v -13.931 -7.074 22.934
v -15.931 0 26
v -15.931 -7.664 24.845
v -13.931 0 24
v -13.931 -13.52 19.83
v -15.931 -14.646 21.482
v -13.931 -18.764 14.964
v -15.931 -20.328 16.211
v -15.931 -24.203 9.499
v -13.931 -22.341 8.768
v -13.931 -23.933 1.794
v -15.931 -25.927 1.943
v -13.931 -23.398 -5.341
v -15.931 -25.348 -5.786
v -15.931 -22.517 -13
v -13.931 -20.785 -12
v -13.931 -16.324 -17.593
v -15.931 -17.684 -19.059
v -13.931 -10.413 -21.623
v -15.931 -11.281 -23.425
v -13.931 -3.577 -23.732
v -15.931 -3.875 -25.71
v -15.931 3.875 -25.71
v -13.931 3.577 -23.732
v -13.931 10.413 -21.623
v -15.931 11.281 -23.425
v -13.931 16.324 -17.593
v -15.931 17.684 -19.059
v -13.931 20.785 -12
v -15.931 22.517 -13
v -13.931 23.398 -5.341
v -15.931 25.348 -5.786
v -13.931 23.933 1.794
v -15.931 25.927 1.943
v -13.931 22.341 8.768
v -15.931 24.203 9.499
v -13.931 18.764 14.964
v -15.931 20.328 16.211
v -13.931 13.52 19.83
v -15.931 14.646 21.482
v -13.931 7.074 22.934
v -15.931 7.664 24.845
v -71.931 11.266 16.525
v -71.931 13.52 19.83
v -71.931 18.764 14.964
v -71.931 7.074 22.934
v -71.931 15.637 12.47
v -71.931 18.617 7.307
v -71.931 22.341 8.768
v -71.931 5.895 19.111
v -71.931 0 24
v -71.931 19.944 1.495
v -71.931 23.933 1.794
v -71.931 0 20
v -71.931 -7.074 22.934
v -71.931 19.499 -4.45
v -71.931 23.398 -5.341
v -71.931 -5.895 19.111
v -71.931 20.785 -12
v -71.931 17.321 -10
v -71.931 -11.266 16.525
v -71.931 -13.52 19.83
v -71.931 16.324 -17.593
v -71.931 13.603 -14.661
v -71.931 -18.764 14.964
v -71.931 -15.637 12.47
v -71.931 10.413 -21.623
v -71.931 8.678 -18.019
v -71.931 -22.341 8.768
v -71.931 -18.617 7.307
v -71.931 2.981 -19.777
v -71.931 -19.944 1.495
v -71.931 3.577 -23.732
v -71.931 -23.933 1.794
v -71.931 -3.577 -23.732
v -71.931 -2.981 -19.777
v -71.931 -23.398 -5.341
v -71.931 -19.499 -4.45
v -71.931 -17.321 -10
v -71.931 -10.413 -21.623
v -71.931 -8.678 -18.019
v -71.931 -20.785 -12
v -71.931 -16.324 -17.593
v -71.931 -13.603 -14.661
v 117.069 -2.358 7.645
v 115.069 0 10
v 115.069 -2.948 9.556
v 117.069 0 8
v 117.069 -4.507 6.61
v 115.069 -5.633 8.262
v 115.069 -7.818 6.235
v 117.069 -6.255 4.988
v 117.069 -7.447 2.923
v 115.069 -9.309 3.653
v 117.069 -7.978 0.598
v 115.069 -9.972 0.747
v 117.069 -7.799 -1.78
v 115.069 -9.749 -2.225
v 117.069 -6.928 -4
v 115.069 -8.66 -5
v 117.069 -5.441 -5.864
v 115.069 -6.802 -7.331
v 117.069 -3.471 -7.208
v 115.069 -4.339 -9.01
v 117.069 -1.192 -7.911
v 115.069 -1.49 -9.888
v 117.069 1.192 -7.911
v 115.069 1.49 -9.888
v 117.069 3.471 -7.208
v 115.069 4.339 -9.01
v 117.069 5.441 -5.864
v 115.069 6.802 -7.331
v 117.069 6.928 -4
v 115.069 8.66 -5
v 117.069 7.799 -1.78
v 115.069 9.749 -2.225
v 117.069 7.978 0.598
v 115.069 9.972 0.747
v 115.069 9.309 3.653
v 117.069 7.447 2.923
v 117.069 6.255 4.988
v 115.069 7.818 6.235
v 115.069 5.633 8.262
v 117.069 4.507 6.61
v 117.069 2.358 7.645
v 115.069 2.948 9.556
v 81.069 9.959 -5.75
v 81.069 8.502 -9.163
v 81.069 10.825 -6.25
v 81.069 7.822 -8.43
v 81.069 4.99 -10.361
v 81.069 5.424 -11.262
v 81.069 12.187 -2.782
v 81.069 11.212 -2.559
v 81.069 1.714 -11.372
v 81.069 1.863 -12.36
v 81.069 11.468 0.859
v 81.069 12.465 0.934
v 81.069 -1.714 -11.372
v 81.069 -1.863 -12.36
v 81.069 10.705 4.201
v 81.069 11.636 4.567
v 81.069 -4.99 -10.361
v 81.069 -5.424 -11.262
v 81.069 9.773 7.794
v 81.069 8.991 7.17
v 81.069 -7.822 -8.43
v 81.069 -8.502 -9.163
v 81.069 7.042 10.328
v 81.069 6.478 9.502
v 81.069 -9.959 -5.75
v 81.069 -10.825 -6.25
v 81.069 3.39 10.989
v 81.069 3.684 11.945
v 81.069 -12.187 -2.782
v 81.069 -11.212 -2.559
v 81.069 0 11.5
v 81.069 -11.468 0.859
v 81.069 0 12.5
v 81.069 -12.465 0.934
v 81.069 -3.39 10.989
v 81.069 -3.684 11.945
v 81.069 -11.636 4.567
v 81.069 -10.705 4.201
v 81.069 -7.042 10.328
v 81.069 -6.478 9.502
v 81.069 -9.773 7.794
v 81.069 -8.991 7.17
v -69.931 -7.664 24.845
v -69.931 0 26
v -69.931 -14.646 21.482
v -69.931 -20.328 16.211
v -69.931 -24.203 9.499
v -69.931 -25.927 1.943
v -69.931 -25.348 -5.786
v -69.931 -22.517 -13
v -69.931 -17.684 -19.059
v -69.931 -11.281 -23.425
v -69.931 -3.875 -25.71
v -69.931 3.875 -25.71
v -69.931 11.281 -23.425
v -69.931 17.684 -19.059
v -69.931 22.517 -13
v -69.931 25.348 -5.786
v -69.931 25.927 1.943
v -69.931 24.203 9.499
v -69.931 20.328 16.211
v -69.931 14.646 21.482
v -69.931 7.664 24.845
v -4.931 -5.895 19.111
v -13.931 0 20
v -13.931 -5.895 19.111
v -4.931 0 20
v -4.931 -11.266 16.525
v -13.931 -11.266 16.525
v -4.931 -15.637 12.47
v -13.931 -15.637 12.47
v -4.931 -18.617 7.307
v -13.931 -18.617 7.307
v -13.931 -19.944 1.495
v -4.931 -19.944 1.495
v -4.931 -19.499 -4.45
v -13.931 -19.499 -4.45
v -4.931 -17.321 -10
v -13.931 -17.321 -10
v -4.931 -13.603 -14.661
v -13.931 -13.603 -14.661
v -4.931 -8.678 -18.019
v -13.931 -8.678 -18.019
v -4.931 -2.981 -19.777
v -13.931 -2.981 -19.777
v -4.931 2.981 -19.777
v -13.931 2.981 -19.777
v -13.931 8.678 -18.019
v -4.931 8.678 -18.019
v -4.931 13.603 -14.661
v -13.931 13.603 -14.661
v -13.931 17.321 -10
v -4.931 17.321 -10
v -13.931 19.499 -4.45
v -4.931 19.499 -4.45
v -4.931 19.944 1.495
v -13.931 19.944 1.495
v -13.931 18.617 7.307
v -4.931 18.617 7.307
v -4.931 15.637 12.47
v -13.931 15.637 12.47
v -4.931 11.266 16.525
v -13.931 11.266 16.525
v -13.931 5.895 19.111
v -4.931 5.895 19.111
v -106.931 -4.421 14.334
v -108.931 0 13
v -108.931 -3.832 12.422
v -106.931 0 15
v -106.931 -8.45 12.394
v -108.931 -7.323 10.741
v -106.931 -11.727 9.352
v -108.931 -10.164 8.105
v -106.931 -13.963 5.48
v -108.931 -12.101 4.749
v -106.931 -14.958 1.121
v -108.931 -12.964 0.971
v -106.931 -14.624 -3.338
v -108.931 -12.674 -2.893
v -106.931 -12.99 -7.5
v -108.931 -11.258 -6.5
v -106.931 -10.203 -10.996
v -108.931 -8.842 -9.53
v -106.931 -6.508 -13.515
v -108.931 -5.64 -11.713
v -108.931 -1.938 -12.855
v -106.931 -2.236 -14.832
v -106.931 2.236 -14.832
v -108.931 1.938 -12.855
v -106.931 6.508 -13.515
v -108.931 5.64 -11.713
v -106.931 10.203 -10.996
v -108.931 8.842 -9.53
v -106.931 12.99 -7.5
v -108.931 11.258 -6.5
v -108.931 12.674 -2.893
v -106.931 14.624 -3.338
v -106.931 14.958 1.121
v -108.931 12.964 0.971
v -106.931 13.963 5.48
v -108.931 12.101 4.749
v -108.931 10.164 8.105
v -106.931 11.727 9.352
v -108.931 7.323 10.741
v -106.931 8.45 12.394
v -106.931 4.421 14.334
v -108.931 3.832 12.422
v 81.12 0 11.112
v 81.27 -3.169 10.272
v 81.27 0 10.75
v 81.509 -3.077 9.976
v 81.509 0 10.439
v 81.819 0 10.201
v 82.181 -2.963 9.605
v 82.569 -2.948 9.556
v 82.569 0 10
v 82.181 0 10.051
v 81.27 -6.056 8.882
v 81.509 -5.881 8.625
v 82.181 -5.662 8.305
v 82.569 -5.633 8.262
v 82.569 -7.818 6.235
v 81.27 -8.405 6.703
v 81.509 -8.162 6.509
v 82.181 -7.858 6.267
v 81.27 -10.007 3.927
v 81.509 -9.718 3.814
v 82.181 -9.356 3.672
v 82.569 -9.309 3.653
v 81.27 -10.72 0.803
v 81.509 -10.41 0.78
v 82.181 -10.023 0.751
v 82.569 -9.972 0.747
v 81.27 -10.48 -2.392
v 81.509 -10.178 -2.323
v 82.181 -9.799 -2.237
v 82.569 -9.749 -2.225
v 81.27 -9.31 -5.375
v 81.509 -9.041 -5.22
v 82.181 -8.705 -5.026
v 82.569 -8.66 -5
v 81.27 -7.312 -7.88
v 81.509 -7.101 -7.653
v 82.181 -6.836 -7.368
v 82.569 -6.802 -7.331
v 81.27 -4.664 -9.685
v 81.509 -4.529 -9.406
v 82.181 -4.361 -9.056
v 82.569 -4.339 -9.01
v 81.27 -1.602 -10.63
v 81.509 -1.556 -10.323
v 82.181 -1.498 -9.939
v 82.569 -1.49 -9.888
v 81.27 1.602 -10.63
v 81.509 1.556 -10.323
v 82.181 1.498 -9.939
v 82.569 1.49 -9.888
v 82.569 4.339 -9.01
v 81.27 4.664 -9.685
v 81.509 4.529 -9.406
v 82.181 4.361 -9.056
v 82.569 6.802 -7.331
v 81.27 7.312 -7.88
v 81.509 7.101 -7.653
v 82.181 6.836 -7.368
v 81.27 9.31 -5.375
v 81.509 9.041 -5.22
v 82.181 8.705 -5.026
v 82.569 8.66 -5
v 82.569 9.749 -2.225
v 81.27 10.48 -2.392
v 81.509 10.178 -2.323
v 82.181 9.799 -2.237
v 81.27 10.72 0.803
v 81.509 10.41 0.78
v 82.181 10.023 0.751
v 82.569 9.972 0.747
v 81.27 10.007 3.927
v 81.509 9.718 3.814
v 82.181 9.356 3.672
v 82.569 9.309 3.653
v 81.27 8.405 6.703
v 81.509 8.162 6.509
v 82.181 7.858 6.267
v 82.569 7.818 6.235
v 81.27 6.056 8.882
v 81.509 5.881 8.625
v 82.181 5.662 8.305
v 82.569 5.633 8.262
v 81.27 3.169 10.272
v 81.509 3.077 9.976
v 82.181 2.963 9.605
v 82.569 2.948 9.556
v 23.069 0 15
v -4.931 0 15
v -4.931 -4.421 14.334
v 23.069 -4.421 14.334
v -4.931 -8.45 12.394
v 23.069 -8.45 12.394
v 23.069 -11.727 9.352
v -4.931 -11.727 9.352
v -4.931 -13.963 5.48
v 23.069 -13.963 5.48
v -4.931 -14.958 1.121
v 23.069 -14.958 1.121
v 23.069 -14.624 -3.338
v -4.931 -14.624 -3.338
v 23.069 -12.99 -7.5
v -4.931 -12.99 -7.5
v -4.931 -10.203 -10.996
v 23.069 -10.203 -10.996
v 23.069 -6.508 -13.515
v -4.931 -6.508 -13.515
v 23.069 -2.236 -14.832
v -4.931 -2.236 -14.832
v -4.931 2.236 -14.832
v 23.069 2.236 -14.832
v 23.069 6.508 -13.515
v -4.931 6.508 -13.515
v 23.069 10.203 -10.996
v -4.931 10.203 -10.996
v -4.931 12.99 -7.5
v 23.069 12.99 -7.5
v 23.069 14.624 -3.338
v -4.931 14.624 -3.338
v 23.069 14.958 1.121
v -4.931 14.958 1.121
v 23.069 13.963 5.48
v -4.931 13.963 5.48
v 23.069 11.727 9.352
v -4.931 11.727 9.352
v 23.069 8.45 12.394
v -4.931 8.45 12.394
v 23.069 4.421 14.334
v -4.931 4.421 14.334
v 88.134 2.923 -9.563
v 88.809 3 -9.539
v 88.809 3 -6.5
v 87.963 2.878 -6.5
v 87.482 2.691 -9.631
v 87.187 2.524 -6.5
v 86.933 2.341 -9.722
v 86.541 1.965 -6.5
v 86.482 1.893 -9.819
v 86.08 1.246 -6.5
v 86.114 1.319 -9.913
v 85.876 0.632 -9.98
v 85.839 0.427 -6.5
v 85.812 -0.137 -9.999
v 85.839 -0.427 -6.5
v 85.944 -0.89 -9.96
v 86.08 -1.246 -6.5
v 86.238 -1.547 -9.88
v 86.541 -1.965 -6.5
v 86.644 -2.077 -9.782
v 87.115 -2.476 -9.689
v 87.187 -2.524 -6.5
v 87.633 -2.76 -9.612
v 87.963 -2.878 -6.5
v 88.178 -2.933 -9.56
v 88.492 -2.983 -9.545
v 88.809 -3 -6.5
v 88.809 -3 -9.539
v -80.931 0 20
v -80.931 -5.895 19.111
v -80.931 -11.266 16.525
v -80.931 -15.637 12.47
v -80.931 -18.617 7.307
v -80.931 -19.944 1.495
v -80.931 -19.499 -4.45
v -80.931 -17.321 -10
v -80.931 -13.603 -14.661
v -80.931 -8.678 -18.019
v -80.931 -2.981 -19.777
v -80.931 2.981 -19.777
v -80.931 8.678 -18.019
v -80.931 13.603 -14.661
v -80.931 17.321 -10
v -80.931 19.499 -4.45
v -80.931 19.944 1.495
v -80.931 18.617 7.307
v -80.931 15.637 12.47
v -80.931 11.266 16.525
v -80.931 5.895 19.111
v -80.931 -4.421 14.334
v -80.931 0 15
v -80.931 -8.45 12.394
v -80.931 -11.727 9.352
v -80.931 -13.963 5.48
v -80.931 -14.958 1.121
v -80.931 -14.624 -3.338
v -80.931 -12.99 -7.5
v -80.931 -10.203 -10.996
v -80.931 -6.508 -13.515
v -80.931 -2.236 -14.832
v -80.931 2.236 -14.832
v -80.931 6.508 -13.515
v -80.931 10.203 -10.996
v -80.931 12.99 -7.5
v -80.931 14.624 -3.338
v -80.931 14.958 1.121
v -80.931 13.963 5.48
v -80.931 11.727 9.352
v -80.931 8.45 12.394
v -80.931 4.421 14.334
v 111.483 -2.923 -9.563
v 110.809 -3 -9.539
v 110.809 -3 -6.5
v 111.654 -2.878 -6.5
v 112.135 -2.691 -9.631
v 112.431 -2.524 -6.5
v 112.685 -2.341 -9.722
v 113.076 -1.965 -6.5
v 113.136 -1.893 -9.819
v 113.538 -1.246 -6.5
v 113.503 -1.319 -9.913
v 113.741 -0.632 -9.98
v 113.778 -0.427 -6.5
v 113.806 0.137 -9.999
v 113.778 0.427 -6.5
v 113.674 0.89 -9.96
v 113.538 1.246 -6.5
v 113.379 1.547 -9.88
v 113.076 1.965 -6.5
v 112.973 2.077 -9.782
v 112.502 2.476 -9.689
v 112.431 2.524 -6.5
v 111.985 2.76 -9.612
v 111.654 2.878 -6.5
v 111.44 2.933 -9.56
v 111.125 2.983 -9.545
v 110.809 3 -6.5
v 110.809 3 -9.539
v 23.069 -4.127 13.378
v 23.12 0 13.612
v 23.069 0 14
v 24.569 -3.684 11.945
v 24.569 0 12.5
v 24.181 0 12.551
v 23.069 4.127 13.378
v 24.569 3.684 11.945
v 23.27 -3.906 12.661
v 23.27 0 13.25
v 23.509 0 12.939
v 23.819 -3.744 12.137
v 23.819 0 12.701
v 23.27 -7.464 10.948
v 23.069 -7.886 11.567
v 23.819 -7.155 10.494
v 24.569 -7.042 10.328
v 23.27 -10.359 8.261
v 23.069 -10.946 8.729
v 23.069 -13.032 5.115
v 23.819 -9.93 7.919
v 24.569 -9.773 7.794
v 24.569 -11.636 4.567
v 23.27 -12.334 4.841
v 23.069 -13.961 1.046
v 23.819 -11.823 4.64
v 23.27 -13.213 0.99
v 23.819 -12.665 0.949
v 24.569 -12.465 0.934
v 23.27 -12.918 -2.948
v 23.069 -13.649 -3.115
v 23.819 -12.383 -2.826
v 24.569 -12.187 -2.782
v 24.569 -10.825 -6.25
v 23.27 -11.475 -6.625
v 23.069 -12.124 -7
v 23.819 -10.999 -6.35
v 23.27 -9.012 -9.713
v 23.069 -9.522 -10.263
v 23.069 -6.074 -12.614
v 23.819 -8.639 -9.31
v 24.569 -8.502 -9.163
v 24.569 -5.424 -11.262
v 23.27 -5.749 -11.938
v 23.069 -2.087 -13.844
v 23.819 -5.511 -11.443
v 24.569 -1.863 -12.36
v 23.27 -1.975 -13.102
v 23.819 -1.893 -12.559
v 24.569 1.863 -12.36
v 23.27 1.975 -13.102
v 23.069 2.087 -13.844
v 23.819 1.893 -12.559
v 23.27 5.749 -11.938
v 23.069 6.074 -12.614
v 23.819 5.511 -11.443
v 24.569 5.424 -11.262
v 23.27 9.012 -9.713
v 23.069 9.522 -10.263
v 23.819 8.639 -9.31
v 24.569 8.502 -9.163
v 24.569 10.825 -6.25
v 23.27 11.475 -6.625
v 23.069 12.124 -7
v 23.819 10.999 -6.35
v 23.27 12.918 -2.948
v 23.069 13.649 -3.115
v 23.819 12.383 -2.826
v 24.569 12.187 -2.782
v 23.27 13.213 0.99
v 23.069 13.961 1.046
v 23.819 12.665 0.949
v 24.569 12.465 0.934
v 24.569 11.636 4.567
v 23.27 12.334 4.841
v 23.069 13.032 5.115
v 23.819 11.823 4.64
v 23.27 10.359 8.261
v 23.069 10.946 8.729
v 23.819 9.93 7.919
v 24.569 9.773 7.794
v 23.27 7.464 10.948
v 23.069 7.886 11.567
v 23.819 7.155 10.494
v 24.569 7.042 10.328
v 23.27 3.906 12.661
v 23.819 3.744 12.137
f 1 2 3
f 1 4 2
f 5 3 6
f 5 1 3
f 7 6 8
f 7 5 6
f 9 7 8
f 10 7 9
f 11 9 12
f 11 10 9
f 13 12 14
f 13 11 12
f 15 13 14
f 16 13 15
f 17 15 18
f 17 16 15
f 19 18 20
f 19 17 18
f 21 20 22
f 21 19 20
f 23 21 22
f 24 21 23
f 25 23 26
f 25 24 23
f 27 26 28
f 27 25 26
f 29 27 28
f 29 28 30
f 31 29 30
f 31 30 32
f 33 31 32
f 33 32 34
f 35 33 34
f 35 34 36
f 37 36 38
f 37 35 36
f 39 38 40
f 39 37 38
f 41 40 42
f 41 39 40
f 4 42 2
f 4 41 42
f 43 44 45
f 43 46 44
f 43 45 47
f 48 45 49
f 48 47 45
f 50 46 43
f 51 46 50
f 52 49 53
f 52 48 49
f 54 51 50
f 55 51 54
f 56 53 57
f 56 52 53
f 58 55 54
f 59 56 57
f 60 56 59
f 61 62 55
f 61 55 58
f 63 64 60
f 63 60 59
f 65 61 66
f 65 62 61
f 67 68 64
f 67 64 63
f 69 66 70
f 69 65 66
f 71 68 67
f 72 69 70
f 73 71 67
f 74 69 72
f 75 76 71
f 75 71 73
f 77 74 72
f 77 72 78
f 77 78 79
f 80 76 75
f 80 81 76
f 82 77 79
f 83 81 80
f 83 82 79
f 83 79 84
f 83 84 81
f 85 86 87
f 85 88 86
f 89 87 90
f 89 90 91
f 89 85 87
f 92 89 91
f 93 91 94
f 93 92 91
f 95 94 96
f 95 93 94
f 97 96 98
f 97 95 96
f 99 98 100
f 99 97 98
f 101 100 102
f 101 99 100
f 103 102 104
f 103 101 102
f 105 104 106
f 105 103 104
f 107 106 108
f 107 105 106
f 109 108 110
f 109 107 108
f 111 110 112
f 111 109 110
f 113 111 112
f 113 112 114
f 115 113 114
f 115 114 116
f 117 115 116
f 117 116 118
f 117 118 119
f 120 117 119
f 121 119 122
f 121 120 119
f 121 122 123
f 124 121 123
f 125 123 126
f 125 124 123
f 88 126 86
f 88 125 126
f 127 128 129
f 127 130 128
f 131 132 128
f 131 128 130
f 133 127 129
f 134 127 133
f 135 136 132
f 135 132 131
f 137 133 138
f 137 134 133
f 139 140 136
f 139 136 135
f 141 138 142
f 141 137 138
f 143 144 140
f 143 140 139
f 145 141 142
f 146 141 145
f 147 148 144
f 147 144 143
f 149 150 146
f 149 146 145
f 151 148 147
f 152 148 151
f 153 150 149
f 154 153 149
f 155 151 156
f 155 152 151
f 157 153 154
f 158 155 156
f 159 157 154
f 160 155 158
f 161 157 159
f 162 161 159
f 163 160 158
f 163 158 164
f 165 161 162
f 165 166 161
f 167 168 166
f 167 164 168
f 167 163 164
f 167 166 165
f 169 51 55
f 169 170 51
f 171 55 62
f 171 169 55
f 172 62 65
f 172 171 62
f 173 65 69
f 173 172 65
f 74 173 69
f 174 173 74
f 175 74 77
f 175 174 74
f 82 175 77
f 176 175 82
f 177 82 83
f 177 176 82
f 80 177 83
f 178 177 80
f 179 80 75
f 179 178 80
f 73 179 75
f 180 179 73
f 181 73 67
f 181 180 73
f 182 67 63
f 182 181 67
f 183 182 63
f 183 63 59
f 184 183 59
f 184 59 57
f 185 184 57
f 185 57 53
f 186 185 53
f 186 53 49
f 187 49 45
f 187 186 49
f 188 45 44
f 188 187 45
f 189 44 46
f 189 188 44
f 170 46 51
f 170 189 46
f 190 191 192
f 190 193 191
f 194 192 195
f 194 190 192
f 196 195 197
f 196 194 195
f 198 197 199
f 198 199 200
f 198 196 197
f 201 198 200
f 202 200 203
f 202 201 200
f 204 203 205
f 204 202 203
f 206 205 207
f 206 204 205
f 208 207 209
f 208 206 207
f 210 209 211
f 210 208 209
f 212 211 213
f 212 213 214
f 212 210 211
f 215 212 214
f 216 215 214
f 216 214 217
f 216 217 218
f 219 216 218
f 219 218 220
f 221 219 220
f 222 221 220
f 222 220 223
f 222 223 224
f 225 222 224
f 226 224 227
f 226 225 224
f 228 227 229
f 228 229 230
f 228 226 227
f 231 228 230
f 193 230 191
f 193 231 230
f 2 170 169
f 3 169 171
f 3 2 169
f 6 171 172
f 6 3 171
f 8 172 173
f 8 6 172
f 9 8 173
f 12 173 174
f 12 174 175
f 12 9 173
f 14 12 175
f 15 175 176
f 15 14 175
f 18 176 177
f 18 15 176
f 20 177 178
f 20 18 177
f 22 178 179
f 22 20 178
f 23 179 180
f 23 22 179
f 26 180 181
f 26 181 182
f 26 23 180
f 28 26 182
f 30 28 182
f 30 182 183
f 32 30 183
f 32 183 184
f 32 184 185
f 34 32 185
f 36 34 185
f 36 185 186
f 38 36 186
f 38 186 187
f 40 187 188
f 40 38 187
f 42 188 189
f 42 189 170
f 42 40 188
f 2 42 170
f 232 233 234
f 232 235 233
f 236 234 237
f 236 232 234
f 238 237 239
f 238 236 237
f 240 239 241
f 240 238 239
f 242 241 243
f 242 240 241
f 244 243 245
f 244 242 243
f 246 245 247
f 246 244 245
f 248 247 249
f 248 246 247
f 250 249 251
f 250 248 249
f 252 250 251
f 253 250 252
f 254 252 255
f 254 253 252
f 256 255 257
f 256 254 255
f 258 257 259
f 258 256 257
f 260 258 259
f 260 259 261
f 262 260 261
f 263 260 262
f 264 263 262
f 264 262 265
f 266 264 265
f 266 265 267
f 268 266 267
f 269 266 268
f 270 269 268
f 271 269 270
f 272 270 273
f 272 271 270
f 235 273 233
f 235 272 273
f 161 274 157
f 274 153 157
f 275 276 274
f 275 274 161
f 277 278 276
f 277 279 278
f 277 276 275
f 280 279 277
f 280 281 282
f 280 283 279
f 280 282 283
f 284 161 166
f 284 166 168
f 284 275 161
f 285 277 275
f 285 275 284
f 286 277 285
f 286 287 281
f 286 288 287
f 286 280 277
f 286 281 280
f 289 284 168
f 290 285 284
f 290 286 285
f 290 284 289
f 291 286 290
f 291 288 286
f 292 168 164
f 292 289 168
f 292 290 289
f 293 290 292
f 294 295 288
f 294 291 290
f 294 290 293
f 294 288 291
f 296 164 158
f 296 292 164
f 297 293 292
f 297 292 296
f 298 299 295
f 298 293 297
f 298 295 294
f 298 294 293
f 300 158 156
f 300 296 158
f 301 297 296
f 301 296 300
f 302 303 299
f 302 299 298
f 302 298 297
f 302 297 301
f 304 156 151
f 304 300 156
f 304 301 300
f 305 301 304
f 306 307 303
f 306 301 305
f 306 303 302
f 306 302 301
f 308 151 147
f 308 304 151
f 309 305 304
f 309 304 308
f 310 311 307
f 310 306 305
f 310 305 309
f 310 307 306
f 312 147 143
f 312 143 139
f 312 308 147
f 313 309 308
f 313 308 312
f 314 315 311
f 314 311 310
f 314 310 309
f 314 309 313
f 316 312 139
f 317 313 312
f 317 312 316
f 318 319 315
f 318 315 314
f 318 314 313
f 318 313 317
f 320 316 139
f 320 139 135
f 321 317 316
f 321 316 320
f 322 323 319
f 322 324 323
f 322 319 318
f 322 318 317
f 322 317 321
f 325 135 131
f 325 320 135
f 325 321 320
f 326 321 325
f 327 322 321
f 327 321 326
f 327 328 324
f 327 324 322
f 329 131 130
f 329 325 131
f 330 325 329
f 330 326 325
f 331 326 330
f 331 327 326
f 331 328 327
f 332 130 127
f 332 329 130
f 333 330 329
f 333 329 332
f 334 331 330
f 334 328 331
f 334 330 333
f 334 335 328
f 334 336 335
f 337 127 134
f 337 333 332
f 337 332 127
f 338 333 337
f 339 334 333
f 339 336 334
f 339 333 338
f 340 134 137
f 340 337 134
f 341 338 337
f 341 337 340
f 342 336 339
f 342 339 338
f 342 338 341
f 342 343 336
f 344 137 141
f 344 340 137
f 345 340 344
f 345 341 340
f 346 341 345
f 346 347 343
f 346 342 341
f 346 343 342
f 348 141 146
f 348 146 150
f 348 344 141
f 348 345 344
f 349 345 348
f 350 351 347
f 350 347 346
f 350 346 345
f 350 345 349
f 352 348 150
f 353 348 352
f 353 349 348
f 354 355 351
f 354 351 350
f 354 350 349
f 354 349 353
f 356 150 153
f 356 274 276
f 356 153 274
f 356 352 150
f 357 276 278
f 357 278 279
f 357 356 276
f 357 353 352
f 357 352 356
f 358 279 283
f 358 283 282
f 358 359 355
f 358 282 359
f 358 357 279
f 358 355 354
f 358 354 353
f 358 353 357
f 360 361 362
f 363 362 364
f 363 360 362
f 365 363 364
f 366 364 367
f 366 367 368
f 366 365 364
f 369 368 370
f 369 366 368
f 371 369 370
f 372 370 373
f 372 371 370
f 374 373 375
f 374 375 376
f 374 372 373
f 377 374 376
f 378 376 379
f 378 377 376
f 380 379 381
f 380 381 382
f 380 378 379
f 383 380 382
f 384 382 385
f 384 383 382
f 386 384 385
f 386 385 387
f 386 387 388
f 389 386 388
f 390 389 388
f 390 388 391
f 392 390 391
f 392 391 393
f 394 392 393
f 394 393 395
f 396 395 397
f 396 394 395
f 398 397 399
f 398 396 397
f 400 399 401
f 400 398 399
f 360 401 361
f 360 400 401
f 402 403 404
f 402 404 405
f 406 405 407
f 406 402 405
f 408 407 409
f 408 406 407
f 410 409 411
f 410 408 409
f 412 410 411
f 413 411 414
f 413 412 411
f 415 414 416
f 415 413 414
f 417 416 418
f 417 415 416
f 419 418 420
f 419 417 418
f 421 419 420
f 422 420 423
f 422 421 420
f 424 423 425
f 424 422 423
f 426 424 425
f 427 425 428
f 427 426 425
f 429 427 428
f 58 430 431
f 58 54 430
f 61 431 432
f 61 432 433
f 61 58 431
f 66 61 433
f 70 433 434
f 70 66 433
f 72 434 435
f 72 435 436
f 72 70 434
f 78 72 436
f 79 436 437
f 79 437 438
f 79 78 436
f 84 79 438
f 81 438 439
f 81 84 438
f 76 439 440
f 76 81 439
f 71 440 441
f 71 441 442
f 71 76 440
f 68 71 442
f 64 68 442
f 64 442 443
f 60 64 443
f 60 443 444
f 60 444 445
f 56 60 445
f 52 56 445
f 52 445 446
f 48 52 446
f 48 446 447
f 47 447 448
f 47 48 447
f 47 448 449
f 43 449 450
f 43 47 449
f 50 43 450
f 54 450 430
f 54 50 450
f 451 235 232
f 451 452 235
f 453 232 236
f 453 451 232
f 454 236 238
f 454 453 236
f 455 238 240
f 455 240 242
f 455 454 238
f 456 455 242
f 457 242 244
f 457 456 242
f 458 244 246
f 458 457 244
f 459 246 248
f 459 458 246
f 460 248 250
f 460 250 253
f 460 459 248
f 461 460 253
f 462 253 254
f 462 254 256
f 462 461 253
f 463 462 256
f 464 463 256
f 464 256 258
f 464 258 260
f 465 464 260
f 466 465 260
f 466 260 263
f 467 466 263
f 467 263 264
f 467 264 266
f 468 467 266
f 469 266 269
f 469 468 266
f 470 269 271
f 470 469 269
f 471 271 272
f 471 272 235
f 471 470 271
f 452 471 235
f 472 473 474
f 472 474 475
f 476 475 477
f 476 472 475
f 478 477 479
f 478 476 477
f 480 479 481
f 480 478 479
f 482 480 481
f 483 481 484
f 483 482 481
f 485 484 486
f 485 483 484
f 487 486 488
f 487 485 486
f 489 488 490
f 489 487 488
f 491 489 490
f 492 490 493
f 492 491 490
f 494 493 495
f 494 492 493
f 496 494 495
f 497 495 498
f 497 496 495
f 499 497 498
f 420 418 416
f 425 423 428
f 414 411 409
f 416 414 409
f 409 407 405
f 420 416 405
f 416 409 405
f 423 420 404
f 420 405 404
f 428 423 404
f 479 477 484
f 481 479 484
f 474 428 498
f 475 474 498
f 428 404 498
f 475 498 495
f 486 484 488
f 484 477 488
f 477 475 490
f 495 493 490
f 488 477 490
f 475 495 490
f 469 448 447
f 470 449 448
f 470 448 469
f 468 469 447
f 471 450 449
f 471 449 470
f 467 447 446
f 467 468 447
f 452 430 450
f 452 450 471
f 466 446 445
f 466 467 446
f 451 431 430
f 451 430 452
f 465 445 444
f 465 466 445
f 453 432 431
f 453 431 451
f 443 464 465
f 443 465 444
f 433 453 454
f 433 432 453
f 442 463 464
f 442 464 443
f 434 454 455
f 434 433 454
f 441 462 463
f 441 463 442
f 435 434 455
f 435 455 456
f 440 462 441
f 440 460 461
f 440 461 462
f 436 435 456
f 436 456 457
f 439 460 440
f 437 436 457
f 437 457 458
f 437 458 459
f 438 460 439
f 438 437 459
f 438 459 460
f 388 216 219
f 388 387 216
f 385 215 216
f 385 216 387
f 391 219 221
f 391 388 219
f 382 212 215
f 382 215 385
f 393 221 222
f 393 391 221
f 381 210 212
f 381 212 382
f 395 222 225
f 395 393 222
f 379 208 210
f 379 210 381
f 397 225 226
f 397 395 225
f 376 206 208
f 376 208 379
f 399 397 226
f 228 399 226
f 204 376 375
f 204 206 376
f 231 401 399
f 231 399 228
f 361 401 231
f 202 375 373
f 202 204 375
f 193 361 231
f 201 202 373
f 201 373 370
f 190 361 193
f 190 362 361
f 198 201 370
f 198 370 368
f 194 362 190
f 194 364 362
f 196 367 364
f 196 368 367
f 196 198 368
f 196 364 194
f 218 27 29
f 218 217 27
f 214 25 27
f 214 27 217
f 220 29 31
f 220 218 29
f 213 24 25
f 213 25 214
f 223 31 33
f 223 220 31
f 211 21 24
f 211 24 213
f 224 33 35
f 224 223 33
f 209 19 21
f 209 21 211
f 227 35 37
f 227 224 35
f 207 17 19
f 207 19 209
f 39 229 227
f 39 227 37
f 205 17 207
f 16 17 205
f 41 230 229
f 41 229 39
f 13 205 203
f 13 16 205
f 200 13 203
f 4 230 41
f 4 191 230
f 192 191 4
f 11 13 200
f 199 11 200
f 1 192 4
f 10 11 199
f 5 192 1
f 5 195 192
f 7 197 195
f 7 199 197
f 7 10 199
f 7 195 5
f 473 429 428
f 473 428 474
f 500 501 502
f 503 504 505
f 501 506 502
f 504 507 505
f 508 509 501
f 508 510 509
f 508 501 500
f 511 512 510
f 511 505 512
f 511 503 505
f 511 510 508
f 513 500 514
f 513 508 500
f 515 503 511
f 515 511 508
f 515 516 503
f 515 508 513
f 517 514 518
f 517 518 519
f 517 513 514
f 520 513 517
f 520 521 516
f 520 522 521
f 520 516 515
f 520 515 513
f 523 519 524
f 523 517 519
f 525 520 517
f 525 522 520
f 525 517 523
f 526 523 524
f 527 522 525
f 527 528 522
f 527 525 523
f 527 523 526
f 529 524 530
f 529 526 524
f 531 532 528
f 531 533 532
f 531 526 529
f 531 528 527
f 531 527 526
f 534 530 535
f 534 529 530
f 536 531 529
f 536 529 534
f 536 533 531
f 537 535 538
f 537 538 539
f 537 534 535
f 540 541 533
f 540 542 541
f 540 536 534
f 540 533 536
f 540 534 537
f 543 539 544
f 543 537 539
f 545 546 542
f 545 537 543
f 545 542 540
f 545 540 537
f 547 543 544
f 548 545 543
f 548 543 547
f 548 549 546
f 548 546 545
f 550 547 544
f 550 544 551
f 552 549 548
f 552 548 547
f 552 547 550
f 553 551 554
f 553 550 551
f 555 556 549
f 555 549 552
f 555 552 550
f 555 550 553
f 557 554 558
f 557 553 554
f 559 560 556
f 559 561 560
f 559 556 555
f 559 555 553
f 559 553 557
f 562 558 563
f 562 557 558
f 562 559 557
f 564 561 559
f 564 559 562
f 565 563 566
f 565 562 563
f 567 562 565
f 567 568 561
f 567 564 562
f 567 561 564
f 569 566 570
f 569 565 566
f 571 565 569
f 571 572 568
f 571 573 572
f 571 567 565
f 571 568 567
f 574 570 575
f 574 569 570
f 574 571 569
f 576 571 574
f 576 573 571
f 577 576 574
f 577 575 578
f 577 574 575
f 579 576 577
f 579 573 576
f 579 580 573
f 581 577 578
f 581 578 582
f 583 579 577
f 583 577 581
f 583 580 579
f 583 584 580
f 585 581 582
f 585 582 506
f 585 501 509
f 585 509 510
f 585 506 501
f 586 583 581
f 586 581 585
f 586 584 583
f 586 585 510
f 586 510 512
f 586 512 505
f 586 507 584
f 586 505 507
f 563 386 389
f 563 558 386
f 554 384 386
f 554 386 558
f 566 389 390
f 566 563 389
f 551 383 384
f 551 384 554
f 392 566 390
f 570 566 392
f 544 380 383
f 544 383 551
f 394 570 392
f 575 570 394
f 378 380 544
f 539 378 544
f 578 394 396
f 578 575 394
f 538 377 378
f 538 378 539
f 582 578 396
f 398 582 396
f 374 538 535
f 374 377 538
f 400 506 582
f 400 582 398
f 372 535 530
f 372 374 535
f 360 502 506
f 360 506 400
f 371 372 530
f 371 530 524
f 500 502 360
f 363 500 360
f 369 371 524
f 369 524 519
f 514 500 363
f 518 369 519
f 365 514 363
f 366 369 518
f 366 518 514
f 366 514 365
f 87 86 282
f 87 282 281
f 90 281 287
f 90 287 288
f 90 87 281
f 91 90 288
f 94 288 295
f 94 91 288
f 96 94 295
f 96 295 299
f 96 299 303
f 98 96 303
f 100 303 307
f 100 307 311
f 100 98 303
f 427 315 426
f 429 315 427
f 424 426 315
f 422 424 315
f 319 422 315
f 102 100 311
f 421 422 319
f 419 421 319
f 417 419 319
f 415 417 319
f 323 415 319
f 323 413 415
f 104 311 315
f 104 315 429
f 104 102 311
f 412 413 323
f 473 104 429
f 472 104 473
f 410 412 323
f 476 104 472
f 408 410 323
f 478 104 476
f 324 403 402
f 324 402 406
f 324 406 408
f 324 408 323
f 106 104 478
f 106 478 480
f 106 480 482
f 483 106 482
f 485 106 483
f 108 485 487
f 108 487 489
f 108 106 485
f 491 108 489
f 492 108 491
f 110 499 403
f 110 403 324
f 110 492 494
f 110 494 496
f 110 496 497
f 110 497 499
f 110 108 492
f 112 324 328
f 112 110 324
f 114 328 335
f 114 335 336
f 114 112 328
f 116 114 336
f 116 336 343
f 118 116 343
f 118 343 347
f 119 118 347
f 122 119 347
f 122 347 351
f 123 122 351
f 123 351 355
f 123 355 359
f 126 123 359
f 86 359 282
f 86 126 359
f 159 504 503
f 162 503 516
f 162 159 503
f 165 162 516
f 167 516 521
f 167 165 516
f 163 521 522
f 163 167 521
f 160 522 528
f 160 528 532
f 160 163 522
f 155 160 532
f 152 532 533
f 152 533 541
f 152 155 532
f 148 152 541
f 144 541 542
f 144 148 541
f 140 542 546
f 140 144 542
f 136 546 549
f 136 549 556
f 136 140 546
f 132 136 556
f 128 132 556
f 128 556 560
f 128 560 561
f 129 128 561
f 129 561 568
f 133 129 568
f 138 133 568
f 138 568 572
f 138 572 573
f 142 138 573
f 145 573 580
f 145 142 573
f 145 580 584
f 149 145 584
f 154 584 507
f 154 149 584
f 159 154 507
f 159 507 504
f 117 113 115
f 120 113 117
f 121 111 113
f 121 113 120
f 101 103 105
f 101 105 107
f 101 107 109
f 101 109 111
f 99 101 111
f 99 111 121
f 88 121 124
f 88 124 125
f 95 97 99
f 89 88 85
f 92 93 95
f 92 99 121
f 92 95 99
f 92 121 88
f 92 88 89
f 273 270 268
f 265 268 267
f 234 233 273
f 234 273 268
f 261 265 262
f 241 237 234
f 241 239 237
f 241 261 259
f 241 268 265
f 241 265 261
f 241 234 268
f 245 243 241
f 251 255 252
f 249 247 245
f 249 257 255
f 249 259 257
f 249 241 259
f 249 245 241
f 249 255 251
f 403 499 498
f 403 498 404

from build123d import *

# Parameters (mm, degrees)
CUT_EXTRUDE_1_DEPTH = 3.5


with BuildPart() as part:
    # 草图1 → 旋转1 (revolve)
    with BuildSketch(Plane.XY, mode=Mode.PRIVATE) as revolve_1_sk:
        with BuildLine():
            Line((-108.930747922, 0), (-108.930747922, 13))
            Line((-108.930747922, 13), (-106.930747922, 15))
            Line((-106.930747922, 15), (-80.930747922, 15))
            Line((-80.930747922, 15), (-80.930747922, 20))
            Line((-80.930747922, 20), (-71.930747922, 20))
            Line((-71.930747922, 20), (-71.930747922, 24))
            Line((-71.930747922, 24), (-69.930747922, 26))
            Line((-69.930747922, 26), (-15.930747922, 26))
            Line((-15.930747922, 26), (-13.930747922, 24))
            Line((-13.930747922, 24), (-13.930747922, 20))
            Line((-13.930747922, 20), (-4.930747922, 20))
            Line((-4.930747922, 20), (-4.930747922, 15))
            Line((-4.930747922, 15), (23.069252078, 15))
            Line((23.069252078, 15), (23.069252078, 14))
            ThreePointArc((23.069252078, 14), (23.508591906, 12.939339828), (24.569252078, 12.5))
            Line((24.569252078, 12.5), (81.069252078, 12.5))
            Line((81.069252078, 12.5), (81.069252078, 11.5))
            ThreePointArc((81.069252078, 11.5), (81.508591906, 10.439339828), (82.569252078, 10))
            Line((82.569252078, 10), (115.069252078, 10))
            Line((115.069252078, 10), (117.069252078, 8))
            Line((117.069252078, 8), (117.069252078, 0))
            Line((117.069252078, 0), (-108.930747922, 0))
        make_face()
    revolve(revolve_1_sk.sketch.rotate(Axis((-108.930747922, 0, 0), (1, 0, 0)), 90), axis=Axis((-108.930747922, 0, 0), (1, 0, 0)))

    # 草图2 → 切除-拉伸1 (cut)
    with BuildSketch(Plane(origin=(0, 0, -10), x_dir=(-1, 0, 0), z_dir=(0, 0, -1))):
        with BuildLine():
            Line((-110.808670822, 3), (-88.808670822, 3))
            ThreePointArc((-88.808670822, 3), (-85.808670822, 0), (-88.808670822, -3))
            Line((-88.808670822, -3), (-110.808670822, -3))
            ThreePointArc((-110.808670822, -3), (-113.808670822, 0), (-110.808670822, 3))
        make_face()
    extrude(amount=-CUT_EXTRUDE_1_DEPTH, mode=Mode.SUBTRACT)


solid = part.part
